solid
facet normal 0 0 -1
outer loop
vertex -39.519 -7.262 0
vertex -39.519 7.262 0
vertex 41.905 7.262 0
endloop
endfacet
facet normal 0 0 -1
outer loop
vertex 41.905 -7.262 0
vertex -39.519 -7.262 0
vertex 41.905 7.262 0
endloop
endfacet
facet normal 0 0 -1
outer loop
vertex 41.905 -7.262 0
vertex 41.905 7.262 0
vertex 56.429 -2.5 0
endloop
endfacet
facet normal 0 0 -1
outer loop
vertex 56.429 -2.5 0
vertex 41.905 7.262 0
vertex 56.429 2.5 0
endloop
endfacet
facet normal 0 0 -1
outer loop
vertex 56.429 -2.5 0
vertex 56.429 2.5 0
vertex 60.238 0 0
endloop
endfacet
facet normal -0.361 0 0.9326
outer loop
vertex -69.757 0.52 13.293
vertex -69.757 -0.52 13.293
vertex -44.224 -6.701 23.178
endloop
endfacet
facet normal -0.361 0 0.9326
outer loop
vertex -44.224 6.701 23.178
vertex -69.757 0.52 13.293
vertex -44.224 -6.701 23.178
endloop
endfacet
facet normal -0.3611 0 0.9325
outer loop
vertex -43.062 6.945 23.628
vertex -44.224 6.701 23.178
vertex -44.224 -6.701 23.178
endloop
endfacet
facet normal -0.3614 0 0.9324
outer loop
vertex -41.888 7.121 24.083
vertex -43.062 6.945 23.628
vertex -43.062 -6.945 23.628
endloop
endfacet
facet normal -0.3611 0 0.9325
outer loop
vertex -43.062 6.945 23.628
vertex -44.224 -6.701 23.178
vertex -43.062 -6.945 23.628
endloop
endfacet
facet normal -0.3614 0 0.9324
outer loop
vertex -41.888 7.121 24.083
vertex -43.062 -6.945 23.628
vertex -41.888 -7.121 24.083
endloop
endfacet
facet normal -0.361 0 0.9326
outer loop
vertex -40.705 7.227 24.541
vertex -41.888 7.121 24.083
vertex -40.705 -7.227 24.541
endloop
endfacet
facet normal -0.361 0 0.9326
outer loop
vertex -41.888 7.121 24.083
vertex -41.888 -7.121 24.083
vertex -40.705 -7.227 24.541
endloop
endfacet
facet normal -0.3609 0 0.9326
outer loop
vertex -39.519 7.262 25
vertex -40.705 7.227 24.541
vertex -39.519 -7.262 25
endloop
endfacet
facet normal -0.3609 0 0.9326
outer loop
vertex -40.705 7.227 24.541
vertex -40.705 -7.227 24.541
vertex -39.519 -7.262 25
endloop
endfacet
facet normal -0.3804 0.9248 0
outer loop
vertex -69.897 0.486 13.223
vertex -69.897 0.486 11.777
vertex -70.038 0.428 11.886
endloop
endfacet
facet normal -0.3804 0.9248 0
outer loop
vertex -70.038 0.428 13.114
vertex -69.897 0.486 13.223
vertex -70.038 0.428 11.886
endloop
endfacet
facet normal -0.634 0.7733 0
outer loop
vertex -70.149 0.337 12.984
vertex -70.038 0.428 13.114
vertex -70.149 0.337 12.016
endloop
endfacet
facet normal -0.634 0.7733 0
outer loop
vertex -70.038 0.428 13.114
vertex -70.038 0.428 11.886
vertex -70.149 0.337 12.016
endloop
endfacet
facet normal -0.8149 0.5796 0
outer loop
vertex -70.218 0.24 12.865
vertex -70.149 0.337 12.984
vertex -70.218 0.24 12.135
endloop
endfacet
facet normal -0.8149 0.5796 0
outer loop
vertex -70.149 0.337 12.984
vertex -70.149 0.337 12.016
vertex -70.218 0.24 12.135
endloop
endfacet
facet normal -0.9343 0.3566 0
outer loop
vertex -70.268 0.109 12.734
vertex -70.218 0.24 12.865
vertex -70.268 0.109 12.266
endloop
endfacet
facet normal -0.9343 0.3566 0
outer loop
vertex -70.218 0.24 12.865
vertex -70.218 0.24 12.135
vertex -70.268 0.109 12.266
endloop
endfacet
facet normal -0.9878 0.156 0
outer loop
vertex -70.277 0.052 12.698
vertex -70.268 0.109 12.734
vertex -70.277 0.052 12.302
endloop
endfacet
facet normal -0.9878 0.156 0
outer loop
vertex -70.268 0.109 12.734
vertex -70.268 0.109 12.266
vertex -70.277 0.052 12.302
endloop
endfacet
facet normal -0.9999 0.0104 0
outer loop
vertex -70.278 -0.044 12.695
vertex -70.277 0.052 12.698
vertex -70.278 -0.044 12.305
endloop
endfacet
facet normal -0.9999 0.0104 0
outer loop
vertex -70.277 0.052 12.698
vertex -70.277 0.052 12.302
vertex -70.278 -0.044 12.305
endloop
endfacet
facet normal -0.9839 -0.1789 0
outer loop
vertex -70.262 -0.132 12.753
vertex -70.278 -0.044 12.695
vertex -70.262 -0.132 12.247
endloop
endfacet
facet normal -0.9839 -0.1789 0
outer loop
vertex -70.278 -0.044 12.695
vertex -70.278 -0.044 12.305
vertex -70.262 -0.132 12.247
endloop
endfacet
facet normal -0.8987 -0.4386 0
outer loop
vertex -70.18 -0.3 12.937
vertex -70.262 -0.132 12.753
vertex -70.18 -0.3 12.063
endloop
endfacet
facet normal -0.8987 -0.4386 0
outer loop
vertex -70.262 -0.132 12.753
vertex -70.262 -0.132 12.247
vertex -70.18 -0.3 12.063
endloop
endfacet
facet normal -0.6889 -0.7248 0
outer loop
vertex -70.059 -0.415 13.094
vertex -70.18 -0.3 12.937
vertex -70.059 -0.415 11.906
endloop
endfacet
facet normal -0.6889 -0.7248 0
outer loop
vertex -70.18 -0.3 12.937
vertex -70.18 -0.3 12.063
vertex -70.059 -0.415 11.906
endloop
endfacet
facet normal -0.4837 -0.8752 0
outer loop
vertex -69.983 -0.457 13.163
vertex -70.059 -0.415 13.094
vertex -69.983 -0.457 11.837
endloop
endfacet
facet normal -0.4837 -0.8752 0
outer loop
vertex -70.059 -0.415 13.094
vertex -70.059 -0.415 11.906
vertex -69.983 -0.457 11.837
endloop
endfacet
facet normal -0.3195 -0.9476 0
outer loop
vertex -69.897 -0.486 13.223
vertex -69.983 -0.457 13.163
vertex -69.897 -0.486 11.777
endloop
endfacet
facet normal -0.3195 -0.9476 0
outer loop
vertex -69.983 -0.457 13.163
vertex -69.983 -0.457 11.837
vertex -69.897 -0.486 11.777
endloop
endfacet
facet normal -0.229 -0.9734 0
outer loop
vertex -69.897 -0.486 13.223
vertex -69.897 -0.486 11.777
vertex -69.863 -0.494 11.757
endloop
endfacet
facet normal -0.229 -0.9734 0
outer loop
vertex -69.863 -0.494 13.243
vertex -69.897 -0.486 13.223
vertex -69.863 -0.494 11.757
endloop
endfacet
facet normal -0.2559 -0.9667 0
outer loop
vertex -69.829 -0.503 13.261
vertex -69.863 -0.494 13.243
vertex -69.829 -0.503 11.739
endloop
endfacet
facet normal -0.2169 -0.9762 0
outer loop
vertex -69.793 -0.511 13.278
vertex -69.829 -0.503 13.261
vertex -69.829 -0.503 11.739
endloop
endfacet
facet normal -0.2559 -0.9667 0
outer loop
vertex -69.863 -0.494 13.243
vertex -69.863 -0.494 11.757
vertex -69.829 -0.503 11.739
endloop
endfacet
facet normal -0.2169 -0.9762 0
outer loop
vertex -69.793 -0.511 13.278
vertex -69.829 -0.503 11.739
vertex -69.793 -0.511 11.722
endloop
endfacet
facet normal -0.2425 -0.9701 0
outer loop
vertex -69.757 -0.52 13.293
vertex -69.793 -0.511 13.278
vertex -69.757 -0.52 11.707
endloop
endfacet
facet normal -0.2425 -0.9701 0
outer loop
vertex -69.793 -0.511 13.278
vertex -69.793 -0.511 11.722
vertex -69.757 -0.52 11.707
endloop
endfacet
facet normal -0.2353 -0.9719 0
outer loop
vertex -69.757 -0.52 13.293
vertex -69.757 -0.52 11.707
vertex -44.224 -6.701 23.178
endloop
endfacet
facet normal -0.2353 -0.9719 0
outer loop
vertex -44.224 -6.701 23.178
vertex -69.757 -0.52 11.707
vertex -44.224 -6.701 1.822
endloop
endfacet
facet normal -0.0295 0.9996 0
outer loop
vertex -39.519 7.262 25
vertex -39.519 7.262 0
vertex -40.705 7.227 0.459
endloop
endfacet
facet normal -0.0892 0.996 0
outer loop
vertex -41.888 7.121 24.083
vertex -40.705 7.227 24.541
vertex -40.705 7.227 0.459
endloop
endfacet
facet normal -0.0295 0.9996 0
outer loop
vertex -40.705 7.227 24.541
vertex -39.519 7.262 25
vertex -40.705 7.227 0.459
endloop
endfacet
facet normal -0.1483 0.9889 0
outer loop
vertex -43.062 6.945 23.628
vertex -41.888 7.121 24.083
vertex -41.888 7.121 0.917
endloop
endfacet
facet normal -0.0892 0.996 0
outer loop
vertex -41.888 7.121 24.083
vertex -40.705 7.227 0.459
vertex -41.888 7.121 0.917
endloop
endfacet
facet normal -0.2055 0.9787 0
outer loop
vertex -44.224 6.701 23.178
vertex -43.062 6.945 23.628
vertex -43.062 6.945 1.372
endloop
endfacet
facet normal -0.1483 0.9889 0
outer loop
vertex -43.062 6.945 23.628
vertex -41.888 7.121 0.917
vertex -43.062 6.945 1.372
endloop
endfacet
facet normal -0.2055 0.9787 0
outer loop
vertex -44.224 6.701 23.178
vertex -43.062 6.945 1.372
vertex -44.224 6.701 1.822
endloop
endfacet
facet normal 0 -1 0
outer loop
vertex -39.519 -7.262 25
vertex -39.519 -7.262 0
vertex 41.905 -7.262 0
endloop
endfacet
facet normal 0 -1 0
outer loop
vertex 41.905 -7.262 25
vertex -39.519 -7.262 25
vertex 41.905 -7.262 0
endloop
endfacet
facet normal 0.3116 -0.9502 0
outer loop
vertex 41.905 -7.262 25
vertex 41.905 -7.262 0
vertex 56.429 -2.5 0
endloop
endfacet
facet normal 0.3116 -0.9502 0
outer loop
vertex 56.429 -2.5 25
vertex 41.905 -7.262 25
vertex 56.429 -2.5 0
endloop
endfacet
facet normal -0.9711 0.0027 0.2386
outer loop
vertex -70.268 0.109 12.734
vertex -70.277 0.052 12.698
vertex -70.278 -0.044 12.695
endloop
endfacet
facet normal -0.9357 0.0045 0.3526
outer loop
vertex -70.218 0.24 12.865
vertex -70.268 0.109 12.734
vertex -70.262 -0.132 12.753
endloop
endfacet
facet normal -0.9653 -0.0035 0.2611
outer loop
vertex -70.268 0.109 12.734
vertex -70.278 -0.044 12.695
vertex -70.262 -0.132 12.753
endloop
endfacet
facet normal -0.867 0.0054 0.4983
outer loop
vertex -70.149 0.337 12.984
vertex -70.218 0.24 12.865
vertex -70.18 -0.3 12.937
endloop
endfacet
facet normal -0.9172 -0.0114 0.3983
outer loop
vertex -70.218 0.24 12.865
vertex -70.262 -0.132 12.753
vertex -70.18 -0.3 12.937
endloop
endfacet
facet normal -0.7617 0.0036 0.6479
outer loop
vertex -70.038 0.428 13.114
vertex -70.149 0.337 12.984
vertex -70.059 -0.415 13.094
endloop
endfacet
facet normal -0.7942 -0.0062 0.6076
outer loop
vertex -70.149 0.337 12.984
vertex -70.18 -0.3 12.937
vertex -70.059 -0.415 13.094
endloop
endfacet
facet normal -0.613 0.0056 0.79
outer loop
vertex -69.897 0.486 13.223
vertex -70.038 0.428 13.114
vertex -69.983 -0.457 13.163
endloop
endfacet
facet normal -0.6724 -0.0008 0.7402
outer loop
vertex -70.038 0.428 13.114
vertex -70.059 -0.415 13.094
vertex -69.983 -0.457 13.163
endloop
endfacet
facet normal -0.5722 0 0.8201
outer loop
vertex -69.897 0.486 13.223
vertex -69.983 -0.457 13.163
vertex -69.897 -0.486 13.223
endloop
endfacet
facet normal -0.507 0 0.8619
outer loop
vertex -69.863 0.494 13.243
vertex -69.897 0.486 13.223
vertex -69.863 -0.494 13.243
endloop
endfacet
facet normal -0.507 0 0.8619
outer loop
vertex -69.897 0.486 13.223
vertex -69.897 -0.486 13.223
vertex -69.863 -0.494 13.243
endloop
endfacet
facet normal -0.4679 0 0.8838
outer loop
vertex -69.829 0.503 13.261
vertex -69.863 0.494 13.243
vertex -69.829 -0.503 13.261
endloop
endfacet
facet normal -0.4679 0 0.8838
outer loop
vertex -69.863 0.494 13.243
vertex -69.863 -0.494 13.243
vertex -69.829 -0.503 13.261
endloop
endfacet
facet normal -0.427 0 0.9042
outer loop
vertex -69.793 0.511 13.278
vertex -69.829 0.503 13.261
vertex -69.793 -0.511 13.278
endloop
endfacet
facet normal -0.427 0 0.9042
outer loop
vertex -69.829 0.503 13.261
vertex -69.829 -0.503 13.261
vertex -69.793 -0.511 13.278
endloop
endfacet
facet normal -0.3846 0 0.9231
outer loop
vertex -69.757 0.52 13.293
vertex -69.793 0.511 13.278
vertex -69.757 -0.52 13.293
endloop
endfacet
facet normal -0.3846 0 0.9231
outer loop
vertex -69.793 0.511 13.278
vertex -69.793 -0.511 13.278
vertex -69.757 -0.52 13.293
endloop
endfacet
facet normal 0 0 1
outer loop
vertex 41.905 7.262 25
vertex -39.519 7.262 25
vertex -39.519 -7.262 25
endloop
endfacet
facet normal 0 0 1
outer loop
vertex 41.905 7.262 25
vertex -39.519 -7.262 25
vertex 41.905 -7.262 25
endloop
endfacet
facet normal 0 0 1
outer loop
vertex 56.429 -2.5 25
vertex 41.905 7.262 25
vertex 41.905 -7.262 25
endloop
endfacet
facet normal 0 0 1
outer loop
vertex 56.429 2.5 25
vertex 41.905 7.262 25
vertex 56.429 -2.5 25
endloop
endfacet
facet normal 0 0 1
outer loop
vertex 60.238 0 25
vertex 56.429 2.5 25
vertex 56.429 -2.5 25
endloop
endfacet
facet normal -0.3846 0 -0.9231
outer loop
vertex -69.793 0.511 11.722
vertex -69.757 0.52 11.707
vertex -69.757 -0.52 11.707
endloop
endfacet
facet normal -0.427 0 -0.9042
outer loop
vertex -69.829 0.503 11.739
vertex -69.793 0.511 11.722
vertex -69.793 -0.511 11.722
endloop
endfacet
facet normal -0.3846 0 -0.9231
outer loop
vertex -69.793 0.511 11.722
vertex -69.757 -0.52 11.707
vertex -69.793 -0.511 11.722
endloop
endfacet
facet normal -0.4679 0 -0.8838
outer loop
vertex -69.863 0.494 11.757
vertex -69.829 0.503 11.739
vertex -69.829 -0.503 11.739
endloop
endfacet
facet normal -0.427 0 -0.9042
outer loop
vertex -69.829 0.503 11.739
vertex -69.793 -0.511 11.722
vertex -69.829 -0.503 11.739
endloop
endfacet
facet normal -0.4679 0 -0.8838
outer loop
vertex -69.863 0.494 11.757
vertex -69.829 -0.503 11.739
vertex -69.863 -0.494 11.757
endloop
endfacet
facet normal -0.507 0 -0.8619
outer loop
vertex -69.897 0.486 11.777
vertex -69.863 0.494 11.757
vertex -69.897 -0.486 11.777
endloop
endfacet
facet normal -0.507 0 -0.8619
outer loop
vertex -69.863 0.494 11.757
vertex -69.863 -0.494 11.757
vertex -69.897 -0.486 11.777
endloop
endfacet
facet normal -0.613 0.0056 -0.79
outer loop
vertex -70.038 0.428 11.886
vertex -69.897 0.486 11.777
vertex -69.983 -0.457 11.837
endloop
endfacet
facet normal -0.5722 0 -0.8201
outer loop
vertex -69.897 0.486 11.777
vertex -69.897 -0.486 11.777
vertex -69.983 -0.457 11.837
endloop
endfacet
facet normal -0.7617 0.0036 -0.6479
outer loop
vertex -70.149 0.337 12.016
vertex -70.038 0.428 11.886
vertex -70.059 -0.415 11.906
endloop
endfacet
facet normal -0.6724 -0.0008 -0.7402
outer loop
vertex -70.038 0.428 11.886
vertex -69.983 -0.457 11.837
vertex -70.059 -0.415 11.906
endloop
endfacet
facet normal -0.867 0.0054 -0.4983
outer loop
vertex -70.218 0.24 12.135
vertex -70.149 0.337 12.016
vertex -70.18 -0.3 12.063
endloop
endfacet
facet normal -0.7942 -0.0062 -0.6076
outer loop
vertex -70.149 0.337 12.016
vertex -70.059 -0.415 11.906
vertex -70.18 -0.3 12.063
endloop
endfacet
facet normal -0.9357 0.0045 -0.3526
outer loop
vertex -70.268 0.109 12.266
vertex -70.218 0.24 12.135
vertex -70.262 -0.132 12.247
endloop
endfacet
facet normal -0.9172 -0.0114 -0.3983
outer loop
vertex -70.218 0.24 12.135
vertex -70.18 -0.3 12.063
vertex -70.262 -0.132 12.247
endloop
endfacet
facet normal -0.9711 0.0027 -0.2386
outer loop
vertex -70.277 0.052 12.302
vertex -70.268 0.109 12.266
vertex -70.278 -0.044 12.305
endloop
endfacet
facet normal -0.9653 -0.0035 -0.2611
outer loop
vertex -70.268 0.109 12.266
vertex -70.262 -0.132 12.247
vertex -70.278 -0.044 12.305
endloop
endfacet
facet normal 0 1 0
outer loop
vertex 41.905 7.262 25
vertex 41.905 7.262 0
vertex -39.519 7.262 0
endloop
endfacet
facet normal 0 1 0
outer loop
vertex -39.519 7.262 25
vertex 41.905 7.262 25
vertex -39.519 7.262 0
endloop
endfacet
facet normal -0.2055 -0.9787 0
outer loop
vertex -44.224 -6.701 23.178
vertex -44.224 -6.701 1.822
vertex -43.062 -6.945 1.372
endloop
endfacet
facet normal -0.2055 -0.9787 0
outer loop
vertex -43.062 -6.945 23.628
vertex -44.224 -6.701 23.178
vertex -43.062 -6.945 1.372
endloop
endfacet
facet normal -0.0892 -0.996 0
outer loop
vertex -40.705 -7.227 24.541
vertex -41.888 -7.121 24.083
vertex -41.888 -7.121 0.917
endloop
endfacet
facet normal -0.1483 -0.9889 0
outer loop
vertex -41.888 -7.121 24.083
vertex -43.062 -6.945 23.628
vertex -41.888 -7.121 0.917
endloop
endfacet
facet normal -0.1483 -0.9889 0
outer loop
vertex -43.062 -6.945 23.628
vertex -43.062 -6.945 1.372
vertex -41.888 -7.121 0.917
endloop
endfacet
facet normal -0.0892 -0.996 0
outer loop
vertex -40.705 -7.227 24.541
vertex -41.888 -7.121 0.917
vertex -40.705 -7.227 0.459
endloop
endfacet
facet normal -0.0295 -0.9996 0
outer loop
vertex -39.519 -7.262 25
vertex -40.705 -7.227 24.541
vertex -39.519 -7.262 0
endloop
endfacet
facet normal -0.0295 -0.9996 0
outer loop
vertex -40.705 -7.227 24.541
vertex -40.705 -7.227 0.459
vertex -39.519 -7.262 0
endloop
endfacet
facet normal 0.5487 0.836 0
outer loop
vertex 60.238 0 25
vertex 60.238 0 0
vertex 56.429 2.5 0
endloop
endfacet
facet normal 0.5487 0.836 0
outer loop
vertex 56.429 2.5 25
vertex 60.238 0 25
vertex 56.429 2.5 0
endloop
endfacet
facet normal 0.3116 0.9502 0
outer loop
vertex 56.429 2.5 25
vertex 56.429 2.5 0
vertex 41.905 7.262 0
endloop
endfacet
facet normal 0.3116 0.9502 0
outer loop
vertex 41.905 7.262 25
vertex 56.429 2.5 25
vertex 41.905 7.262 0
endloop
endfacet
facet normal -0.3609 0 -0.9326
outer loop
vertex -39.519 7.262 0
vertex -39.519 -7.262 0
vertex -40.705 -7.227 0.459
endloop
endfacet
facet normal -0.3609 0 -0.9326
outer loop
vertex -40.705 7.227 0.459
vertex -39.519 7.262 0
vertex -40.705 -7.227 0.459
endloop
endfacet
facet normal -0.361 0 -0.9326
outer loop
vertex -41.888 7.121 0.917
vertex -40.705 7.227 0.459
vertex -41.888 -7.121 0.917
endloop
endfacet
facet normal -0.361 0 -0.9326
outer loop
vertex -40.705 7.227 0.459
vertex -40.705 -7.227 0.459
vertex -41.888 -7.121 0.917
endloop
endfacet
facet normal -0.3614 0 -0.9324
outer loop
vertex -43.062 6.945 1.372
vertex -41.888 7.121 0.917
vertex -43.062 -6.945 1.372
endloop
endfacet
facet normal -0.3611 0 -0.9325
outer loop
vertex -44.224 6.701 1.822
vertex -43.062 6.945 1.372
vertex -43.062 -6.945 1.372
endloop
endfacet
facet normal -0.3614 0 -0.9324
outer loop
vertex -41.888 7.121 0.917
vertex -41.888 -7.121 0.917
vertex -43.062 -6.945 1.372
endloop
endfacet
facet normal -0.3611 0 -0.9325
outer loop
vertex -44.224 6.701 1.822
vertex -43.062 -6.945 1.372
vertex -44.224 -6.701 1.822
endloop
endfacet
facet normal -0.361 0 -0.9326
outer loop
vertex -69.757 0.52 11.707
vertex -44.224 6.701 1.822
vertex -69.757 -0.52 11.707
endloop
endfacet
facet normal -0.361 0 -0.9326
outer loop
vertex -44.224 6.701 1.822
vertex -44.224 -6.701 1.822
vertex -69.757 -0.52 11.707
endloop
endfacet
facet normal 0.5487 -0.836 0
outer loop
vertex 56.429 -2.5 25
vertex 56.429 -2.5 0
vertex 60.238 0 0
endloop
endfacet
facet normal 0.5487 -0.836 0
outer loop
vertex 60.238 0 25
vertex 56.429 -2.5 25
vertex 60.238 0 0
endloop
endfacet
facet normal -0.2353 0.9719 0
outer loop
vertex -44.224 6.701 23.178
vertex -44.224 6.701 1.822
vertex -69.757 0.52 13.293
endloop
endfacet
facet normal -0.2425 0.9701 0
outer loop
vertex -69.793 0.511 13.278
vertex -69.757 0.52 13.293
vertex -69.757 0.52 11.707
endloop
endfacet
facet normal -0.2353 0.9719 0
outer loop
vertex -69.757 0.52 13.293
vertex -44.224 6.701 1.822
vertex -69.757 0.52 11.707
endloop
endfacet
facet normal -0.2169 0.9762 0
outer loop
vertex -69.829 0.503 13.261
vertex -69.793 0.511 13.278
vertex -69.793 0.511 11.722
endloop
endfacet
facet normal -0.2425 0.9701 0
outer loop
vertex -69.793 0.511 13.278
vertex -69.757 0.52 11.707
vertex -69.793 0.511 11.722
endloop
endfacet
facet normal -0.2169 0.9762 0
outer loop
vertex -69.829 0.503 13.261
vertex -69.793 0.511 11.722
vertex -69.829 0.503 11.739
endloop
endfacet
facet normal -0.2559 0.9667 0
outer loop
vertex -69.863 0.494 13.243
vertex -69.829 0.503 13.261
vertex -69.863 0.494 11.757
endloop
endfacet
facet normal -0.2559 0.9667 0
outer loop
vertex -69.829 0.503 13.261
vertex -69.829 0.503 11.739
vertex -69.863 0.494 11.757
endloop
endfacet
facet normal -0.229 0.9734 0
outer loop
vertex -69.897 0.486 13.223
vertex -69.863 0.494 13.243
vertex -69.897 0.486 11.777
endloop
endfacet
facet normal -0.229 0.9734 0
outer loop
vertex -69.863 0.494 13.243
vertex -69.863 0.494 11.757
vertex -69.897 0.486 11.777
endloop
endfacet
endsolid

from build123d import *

# Parameters (mm, degrees)
F1_DEPTH = 25
F3_DEPTH = 14.524811


with BuildPart() as f1:
    # F0 (on Top) → F1 (new body)
    with BuildSketch(Plane.XY):
        with BuildLine():
            Line((56.428571, 2.5), (41.904763, 7.261906))
            Line((41.904763, 7.261906), (-39.518585, 7.261906))
            ThreePointArc((-39.518585, 7.261906), (-41.887959, 7.121061), (-44.223962, 6.700512))
            Line((-44.223962, 6.700512), (-69.89717, 0.485965))
            ThreePointArc((-69.89717, 0.485965), (-70.279535, 0), (-69.89717, -0.485965))
            Line((-69.89717, -0.485965), (-44.223962, -6.700512))
            ThreePointArc((-44.223962, -6.700512), (-41.887959, -7.121061), (-39.518585, -7.261906))
            Line((-39.518585, -7.261906), (41.904763, -7.261906))
            Line((41.904763, -7.261906), (56.428571, -2.5))
            Line((56.428571, -2.5), (60.23809, 0))
            Line((60.23809, 0), (56.428571, 2.5))
        make_face()
    extrude(amount=F1_DEPTH)

    # F2 (on face) → F3 (cut, through all)
    with BuildSketch(Plane.XZ.offset(7.261906)):
        with BuildLine():
            Line((-69.757227, 13.292665), (-39.518585, 25))
            Line((-39.518585, 25), (-72.551064, 25))
            Line((-72.551064, 25), (-72.551064, 0))
            Line((-72.551064, 0), (-39.518585, 0))
            Line((-39.518585, 0), (-69.757227, 11.707335))
            ThreePointArc((-69.757227, 11.707335), (-70.300335, 12.5), (-69.757227, 13.292665))
        make_face()
    extrude(amount=-F3_DEPTH, mode=Mode.SUBTRACT)


solid = f1.part
